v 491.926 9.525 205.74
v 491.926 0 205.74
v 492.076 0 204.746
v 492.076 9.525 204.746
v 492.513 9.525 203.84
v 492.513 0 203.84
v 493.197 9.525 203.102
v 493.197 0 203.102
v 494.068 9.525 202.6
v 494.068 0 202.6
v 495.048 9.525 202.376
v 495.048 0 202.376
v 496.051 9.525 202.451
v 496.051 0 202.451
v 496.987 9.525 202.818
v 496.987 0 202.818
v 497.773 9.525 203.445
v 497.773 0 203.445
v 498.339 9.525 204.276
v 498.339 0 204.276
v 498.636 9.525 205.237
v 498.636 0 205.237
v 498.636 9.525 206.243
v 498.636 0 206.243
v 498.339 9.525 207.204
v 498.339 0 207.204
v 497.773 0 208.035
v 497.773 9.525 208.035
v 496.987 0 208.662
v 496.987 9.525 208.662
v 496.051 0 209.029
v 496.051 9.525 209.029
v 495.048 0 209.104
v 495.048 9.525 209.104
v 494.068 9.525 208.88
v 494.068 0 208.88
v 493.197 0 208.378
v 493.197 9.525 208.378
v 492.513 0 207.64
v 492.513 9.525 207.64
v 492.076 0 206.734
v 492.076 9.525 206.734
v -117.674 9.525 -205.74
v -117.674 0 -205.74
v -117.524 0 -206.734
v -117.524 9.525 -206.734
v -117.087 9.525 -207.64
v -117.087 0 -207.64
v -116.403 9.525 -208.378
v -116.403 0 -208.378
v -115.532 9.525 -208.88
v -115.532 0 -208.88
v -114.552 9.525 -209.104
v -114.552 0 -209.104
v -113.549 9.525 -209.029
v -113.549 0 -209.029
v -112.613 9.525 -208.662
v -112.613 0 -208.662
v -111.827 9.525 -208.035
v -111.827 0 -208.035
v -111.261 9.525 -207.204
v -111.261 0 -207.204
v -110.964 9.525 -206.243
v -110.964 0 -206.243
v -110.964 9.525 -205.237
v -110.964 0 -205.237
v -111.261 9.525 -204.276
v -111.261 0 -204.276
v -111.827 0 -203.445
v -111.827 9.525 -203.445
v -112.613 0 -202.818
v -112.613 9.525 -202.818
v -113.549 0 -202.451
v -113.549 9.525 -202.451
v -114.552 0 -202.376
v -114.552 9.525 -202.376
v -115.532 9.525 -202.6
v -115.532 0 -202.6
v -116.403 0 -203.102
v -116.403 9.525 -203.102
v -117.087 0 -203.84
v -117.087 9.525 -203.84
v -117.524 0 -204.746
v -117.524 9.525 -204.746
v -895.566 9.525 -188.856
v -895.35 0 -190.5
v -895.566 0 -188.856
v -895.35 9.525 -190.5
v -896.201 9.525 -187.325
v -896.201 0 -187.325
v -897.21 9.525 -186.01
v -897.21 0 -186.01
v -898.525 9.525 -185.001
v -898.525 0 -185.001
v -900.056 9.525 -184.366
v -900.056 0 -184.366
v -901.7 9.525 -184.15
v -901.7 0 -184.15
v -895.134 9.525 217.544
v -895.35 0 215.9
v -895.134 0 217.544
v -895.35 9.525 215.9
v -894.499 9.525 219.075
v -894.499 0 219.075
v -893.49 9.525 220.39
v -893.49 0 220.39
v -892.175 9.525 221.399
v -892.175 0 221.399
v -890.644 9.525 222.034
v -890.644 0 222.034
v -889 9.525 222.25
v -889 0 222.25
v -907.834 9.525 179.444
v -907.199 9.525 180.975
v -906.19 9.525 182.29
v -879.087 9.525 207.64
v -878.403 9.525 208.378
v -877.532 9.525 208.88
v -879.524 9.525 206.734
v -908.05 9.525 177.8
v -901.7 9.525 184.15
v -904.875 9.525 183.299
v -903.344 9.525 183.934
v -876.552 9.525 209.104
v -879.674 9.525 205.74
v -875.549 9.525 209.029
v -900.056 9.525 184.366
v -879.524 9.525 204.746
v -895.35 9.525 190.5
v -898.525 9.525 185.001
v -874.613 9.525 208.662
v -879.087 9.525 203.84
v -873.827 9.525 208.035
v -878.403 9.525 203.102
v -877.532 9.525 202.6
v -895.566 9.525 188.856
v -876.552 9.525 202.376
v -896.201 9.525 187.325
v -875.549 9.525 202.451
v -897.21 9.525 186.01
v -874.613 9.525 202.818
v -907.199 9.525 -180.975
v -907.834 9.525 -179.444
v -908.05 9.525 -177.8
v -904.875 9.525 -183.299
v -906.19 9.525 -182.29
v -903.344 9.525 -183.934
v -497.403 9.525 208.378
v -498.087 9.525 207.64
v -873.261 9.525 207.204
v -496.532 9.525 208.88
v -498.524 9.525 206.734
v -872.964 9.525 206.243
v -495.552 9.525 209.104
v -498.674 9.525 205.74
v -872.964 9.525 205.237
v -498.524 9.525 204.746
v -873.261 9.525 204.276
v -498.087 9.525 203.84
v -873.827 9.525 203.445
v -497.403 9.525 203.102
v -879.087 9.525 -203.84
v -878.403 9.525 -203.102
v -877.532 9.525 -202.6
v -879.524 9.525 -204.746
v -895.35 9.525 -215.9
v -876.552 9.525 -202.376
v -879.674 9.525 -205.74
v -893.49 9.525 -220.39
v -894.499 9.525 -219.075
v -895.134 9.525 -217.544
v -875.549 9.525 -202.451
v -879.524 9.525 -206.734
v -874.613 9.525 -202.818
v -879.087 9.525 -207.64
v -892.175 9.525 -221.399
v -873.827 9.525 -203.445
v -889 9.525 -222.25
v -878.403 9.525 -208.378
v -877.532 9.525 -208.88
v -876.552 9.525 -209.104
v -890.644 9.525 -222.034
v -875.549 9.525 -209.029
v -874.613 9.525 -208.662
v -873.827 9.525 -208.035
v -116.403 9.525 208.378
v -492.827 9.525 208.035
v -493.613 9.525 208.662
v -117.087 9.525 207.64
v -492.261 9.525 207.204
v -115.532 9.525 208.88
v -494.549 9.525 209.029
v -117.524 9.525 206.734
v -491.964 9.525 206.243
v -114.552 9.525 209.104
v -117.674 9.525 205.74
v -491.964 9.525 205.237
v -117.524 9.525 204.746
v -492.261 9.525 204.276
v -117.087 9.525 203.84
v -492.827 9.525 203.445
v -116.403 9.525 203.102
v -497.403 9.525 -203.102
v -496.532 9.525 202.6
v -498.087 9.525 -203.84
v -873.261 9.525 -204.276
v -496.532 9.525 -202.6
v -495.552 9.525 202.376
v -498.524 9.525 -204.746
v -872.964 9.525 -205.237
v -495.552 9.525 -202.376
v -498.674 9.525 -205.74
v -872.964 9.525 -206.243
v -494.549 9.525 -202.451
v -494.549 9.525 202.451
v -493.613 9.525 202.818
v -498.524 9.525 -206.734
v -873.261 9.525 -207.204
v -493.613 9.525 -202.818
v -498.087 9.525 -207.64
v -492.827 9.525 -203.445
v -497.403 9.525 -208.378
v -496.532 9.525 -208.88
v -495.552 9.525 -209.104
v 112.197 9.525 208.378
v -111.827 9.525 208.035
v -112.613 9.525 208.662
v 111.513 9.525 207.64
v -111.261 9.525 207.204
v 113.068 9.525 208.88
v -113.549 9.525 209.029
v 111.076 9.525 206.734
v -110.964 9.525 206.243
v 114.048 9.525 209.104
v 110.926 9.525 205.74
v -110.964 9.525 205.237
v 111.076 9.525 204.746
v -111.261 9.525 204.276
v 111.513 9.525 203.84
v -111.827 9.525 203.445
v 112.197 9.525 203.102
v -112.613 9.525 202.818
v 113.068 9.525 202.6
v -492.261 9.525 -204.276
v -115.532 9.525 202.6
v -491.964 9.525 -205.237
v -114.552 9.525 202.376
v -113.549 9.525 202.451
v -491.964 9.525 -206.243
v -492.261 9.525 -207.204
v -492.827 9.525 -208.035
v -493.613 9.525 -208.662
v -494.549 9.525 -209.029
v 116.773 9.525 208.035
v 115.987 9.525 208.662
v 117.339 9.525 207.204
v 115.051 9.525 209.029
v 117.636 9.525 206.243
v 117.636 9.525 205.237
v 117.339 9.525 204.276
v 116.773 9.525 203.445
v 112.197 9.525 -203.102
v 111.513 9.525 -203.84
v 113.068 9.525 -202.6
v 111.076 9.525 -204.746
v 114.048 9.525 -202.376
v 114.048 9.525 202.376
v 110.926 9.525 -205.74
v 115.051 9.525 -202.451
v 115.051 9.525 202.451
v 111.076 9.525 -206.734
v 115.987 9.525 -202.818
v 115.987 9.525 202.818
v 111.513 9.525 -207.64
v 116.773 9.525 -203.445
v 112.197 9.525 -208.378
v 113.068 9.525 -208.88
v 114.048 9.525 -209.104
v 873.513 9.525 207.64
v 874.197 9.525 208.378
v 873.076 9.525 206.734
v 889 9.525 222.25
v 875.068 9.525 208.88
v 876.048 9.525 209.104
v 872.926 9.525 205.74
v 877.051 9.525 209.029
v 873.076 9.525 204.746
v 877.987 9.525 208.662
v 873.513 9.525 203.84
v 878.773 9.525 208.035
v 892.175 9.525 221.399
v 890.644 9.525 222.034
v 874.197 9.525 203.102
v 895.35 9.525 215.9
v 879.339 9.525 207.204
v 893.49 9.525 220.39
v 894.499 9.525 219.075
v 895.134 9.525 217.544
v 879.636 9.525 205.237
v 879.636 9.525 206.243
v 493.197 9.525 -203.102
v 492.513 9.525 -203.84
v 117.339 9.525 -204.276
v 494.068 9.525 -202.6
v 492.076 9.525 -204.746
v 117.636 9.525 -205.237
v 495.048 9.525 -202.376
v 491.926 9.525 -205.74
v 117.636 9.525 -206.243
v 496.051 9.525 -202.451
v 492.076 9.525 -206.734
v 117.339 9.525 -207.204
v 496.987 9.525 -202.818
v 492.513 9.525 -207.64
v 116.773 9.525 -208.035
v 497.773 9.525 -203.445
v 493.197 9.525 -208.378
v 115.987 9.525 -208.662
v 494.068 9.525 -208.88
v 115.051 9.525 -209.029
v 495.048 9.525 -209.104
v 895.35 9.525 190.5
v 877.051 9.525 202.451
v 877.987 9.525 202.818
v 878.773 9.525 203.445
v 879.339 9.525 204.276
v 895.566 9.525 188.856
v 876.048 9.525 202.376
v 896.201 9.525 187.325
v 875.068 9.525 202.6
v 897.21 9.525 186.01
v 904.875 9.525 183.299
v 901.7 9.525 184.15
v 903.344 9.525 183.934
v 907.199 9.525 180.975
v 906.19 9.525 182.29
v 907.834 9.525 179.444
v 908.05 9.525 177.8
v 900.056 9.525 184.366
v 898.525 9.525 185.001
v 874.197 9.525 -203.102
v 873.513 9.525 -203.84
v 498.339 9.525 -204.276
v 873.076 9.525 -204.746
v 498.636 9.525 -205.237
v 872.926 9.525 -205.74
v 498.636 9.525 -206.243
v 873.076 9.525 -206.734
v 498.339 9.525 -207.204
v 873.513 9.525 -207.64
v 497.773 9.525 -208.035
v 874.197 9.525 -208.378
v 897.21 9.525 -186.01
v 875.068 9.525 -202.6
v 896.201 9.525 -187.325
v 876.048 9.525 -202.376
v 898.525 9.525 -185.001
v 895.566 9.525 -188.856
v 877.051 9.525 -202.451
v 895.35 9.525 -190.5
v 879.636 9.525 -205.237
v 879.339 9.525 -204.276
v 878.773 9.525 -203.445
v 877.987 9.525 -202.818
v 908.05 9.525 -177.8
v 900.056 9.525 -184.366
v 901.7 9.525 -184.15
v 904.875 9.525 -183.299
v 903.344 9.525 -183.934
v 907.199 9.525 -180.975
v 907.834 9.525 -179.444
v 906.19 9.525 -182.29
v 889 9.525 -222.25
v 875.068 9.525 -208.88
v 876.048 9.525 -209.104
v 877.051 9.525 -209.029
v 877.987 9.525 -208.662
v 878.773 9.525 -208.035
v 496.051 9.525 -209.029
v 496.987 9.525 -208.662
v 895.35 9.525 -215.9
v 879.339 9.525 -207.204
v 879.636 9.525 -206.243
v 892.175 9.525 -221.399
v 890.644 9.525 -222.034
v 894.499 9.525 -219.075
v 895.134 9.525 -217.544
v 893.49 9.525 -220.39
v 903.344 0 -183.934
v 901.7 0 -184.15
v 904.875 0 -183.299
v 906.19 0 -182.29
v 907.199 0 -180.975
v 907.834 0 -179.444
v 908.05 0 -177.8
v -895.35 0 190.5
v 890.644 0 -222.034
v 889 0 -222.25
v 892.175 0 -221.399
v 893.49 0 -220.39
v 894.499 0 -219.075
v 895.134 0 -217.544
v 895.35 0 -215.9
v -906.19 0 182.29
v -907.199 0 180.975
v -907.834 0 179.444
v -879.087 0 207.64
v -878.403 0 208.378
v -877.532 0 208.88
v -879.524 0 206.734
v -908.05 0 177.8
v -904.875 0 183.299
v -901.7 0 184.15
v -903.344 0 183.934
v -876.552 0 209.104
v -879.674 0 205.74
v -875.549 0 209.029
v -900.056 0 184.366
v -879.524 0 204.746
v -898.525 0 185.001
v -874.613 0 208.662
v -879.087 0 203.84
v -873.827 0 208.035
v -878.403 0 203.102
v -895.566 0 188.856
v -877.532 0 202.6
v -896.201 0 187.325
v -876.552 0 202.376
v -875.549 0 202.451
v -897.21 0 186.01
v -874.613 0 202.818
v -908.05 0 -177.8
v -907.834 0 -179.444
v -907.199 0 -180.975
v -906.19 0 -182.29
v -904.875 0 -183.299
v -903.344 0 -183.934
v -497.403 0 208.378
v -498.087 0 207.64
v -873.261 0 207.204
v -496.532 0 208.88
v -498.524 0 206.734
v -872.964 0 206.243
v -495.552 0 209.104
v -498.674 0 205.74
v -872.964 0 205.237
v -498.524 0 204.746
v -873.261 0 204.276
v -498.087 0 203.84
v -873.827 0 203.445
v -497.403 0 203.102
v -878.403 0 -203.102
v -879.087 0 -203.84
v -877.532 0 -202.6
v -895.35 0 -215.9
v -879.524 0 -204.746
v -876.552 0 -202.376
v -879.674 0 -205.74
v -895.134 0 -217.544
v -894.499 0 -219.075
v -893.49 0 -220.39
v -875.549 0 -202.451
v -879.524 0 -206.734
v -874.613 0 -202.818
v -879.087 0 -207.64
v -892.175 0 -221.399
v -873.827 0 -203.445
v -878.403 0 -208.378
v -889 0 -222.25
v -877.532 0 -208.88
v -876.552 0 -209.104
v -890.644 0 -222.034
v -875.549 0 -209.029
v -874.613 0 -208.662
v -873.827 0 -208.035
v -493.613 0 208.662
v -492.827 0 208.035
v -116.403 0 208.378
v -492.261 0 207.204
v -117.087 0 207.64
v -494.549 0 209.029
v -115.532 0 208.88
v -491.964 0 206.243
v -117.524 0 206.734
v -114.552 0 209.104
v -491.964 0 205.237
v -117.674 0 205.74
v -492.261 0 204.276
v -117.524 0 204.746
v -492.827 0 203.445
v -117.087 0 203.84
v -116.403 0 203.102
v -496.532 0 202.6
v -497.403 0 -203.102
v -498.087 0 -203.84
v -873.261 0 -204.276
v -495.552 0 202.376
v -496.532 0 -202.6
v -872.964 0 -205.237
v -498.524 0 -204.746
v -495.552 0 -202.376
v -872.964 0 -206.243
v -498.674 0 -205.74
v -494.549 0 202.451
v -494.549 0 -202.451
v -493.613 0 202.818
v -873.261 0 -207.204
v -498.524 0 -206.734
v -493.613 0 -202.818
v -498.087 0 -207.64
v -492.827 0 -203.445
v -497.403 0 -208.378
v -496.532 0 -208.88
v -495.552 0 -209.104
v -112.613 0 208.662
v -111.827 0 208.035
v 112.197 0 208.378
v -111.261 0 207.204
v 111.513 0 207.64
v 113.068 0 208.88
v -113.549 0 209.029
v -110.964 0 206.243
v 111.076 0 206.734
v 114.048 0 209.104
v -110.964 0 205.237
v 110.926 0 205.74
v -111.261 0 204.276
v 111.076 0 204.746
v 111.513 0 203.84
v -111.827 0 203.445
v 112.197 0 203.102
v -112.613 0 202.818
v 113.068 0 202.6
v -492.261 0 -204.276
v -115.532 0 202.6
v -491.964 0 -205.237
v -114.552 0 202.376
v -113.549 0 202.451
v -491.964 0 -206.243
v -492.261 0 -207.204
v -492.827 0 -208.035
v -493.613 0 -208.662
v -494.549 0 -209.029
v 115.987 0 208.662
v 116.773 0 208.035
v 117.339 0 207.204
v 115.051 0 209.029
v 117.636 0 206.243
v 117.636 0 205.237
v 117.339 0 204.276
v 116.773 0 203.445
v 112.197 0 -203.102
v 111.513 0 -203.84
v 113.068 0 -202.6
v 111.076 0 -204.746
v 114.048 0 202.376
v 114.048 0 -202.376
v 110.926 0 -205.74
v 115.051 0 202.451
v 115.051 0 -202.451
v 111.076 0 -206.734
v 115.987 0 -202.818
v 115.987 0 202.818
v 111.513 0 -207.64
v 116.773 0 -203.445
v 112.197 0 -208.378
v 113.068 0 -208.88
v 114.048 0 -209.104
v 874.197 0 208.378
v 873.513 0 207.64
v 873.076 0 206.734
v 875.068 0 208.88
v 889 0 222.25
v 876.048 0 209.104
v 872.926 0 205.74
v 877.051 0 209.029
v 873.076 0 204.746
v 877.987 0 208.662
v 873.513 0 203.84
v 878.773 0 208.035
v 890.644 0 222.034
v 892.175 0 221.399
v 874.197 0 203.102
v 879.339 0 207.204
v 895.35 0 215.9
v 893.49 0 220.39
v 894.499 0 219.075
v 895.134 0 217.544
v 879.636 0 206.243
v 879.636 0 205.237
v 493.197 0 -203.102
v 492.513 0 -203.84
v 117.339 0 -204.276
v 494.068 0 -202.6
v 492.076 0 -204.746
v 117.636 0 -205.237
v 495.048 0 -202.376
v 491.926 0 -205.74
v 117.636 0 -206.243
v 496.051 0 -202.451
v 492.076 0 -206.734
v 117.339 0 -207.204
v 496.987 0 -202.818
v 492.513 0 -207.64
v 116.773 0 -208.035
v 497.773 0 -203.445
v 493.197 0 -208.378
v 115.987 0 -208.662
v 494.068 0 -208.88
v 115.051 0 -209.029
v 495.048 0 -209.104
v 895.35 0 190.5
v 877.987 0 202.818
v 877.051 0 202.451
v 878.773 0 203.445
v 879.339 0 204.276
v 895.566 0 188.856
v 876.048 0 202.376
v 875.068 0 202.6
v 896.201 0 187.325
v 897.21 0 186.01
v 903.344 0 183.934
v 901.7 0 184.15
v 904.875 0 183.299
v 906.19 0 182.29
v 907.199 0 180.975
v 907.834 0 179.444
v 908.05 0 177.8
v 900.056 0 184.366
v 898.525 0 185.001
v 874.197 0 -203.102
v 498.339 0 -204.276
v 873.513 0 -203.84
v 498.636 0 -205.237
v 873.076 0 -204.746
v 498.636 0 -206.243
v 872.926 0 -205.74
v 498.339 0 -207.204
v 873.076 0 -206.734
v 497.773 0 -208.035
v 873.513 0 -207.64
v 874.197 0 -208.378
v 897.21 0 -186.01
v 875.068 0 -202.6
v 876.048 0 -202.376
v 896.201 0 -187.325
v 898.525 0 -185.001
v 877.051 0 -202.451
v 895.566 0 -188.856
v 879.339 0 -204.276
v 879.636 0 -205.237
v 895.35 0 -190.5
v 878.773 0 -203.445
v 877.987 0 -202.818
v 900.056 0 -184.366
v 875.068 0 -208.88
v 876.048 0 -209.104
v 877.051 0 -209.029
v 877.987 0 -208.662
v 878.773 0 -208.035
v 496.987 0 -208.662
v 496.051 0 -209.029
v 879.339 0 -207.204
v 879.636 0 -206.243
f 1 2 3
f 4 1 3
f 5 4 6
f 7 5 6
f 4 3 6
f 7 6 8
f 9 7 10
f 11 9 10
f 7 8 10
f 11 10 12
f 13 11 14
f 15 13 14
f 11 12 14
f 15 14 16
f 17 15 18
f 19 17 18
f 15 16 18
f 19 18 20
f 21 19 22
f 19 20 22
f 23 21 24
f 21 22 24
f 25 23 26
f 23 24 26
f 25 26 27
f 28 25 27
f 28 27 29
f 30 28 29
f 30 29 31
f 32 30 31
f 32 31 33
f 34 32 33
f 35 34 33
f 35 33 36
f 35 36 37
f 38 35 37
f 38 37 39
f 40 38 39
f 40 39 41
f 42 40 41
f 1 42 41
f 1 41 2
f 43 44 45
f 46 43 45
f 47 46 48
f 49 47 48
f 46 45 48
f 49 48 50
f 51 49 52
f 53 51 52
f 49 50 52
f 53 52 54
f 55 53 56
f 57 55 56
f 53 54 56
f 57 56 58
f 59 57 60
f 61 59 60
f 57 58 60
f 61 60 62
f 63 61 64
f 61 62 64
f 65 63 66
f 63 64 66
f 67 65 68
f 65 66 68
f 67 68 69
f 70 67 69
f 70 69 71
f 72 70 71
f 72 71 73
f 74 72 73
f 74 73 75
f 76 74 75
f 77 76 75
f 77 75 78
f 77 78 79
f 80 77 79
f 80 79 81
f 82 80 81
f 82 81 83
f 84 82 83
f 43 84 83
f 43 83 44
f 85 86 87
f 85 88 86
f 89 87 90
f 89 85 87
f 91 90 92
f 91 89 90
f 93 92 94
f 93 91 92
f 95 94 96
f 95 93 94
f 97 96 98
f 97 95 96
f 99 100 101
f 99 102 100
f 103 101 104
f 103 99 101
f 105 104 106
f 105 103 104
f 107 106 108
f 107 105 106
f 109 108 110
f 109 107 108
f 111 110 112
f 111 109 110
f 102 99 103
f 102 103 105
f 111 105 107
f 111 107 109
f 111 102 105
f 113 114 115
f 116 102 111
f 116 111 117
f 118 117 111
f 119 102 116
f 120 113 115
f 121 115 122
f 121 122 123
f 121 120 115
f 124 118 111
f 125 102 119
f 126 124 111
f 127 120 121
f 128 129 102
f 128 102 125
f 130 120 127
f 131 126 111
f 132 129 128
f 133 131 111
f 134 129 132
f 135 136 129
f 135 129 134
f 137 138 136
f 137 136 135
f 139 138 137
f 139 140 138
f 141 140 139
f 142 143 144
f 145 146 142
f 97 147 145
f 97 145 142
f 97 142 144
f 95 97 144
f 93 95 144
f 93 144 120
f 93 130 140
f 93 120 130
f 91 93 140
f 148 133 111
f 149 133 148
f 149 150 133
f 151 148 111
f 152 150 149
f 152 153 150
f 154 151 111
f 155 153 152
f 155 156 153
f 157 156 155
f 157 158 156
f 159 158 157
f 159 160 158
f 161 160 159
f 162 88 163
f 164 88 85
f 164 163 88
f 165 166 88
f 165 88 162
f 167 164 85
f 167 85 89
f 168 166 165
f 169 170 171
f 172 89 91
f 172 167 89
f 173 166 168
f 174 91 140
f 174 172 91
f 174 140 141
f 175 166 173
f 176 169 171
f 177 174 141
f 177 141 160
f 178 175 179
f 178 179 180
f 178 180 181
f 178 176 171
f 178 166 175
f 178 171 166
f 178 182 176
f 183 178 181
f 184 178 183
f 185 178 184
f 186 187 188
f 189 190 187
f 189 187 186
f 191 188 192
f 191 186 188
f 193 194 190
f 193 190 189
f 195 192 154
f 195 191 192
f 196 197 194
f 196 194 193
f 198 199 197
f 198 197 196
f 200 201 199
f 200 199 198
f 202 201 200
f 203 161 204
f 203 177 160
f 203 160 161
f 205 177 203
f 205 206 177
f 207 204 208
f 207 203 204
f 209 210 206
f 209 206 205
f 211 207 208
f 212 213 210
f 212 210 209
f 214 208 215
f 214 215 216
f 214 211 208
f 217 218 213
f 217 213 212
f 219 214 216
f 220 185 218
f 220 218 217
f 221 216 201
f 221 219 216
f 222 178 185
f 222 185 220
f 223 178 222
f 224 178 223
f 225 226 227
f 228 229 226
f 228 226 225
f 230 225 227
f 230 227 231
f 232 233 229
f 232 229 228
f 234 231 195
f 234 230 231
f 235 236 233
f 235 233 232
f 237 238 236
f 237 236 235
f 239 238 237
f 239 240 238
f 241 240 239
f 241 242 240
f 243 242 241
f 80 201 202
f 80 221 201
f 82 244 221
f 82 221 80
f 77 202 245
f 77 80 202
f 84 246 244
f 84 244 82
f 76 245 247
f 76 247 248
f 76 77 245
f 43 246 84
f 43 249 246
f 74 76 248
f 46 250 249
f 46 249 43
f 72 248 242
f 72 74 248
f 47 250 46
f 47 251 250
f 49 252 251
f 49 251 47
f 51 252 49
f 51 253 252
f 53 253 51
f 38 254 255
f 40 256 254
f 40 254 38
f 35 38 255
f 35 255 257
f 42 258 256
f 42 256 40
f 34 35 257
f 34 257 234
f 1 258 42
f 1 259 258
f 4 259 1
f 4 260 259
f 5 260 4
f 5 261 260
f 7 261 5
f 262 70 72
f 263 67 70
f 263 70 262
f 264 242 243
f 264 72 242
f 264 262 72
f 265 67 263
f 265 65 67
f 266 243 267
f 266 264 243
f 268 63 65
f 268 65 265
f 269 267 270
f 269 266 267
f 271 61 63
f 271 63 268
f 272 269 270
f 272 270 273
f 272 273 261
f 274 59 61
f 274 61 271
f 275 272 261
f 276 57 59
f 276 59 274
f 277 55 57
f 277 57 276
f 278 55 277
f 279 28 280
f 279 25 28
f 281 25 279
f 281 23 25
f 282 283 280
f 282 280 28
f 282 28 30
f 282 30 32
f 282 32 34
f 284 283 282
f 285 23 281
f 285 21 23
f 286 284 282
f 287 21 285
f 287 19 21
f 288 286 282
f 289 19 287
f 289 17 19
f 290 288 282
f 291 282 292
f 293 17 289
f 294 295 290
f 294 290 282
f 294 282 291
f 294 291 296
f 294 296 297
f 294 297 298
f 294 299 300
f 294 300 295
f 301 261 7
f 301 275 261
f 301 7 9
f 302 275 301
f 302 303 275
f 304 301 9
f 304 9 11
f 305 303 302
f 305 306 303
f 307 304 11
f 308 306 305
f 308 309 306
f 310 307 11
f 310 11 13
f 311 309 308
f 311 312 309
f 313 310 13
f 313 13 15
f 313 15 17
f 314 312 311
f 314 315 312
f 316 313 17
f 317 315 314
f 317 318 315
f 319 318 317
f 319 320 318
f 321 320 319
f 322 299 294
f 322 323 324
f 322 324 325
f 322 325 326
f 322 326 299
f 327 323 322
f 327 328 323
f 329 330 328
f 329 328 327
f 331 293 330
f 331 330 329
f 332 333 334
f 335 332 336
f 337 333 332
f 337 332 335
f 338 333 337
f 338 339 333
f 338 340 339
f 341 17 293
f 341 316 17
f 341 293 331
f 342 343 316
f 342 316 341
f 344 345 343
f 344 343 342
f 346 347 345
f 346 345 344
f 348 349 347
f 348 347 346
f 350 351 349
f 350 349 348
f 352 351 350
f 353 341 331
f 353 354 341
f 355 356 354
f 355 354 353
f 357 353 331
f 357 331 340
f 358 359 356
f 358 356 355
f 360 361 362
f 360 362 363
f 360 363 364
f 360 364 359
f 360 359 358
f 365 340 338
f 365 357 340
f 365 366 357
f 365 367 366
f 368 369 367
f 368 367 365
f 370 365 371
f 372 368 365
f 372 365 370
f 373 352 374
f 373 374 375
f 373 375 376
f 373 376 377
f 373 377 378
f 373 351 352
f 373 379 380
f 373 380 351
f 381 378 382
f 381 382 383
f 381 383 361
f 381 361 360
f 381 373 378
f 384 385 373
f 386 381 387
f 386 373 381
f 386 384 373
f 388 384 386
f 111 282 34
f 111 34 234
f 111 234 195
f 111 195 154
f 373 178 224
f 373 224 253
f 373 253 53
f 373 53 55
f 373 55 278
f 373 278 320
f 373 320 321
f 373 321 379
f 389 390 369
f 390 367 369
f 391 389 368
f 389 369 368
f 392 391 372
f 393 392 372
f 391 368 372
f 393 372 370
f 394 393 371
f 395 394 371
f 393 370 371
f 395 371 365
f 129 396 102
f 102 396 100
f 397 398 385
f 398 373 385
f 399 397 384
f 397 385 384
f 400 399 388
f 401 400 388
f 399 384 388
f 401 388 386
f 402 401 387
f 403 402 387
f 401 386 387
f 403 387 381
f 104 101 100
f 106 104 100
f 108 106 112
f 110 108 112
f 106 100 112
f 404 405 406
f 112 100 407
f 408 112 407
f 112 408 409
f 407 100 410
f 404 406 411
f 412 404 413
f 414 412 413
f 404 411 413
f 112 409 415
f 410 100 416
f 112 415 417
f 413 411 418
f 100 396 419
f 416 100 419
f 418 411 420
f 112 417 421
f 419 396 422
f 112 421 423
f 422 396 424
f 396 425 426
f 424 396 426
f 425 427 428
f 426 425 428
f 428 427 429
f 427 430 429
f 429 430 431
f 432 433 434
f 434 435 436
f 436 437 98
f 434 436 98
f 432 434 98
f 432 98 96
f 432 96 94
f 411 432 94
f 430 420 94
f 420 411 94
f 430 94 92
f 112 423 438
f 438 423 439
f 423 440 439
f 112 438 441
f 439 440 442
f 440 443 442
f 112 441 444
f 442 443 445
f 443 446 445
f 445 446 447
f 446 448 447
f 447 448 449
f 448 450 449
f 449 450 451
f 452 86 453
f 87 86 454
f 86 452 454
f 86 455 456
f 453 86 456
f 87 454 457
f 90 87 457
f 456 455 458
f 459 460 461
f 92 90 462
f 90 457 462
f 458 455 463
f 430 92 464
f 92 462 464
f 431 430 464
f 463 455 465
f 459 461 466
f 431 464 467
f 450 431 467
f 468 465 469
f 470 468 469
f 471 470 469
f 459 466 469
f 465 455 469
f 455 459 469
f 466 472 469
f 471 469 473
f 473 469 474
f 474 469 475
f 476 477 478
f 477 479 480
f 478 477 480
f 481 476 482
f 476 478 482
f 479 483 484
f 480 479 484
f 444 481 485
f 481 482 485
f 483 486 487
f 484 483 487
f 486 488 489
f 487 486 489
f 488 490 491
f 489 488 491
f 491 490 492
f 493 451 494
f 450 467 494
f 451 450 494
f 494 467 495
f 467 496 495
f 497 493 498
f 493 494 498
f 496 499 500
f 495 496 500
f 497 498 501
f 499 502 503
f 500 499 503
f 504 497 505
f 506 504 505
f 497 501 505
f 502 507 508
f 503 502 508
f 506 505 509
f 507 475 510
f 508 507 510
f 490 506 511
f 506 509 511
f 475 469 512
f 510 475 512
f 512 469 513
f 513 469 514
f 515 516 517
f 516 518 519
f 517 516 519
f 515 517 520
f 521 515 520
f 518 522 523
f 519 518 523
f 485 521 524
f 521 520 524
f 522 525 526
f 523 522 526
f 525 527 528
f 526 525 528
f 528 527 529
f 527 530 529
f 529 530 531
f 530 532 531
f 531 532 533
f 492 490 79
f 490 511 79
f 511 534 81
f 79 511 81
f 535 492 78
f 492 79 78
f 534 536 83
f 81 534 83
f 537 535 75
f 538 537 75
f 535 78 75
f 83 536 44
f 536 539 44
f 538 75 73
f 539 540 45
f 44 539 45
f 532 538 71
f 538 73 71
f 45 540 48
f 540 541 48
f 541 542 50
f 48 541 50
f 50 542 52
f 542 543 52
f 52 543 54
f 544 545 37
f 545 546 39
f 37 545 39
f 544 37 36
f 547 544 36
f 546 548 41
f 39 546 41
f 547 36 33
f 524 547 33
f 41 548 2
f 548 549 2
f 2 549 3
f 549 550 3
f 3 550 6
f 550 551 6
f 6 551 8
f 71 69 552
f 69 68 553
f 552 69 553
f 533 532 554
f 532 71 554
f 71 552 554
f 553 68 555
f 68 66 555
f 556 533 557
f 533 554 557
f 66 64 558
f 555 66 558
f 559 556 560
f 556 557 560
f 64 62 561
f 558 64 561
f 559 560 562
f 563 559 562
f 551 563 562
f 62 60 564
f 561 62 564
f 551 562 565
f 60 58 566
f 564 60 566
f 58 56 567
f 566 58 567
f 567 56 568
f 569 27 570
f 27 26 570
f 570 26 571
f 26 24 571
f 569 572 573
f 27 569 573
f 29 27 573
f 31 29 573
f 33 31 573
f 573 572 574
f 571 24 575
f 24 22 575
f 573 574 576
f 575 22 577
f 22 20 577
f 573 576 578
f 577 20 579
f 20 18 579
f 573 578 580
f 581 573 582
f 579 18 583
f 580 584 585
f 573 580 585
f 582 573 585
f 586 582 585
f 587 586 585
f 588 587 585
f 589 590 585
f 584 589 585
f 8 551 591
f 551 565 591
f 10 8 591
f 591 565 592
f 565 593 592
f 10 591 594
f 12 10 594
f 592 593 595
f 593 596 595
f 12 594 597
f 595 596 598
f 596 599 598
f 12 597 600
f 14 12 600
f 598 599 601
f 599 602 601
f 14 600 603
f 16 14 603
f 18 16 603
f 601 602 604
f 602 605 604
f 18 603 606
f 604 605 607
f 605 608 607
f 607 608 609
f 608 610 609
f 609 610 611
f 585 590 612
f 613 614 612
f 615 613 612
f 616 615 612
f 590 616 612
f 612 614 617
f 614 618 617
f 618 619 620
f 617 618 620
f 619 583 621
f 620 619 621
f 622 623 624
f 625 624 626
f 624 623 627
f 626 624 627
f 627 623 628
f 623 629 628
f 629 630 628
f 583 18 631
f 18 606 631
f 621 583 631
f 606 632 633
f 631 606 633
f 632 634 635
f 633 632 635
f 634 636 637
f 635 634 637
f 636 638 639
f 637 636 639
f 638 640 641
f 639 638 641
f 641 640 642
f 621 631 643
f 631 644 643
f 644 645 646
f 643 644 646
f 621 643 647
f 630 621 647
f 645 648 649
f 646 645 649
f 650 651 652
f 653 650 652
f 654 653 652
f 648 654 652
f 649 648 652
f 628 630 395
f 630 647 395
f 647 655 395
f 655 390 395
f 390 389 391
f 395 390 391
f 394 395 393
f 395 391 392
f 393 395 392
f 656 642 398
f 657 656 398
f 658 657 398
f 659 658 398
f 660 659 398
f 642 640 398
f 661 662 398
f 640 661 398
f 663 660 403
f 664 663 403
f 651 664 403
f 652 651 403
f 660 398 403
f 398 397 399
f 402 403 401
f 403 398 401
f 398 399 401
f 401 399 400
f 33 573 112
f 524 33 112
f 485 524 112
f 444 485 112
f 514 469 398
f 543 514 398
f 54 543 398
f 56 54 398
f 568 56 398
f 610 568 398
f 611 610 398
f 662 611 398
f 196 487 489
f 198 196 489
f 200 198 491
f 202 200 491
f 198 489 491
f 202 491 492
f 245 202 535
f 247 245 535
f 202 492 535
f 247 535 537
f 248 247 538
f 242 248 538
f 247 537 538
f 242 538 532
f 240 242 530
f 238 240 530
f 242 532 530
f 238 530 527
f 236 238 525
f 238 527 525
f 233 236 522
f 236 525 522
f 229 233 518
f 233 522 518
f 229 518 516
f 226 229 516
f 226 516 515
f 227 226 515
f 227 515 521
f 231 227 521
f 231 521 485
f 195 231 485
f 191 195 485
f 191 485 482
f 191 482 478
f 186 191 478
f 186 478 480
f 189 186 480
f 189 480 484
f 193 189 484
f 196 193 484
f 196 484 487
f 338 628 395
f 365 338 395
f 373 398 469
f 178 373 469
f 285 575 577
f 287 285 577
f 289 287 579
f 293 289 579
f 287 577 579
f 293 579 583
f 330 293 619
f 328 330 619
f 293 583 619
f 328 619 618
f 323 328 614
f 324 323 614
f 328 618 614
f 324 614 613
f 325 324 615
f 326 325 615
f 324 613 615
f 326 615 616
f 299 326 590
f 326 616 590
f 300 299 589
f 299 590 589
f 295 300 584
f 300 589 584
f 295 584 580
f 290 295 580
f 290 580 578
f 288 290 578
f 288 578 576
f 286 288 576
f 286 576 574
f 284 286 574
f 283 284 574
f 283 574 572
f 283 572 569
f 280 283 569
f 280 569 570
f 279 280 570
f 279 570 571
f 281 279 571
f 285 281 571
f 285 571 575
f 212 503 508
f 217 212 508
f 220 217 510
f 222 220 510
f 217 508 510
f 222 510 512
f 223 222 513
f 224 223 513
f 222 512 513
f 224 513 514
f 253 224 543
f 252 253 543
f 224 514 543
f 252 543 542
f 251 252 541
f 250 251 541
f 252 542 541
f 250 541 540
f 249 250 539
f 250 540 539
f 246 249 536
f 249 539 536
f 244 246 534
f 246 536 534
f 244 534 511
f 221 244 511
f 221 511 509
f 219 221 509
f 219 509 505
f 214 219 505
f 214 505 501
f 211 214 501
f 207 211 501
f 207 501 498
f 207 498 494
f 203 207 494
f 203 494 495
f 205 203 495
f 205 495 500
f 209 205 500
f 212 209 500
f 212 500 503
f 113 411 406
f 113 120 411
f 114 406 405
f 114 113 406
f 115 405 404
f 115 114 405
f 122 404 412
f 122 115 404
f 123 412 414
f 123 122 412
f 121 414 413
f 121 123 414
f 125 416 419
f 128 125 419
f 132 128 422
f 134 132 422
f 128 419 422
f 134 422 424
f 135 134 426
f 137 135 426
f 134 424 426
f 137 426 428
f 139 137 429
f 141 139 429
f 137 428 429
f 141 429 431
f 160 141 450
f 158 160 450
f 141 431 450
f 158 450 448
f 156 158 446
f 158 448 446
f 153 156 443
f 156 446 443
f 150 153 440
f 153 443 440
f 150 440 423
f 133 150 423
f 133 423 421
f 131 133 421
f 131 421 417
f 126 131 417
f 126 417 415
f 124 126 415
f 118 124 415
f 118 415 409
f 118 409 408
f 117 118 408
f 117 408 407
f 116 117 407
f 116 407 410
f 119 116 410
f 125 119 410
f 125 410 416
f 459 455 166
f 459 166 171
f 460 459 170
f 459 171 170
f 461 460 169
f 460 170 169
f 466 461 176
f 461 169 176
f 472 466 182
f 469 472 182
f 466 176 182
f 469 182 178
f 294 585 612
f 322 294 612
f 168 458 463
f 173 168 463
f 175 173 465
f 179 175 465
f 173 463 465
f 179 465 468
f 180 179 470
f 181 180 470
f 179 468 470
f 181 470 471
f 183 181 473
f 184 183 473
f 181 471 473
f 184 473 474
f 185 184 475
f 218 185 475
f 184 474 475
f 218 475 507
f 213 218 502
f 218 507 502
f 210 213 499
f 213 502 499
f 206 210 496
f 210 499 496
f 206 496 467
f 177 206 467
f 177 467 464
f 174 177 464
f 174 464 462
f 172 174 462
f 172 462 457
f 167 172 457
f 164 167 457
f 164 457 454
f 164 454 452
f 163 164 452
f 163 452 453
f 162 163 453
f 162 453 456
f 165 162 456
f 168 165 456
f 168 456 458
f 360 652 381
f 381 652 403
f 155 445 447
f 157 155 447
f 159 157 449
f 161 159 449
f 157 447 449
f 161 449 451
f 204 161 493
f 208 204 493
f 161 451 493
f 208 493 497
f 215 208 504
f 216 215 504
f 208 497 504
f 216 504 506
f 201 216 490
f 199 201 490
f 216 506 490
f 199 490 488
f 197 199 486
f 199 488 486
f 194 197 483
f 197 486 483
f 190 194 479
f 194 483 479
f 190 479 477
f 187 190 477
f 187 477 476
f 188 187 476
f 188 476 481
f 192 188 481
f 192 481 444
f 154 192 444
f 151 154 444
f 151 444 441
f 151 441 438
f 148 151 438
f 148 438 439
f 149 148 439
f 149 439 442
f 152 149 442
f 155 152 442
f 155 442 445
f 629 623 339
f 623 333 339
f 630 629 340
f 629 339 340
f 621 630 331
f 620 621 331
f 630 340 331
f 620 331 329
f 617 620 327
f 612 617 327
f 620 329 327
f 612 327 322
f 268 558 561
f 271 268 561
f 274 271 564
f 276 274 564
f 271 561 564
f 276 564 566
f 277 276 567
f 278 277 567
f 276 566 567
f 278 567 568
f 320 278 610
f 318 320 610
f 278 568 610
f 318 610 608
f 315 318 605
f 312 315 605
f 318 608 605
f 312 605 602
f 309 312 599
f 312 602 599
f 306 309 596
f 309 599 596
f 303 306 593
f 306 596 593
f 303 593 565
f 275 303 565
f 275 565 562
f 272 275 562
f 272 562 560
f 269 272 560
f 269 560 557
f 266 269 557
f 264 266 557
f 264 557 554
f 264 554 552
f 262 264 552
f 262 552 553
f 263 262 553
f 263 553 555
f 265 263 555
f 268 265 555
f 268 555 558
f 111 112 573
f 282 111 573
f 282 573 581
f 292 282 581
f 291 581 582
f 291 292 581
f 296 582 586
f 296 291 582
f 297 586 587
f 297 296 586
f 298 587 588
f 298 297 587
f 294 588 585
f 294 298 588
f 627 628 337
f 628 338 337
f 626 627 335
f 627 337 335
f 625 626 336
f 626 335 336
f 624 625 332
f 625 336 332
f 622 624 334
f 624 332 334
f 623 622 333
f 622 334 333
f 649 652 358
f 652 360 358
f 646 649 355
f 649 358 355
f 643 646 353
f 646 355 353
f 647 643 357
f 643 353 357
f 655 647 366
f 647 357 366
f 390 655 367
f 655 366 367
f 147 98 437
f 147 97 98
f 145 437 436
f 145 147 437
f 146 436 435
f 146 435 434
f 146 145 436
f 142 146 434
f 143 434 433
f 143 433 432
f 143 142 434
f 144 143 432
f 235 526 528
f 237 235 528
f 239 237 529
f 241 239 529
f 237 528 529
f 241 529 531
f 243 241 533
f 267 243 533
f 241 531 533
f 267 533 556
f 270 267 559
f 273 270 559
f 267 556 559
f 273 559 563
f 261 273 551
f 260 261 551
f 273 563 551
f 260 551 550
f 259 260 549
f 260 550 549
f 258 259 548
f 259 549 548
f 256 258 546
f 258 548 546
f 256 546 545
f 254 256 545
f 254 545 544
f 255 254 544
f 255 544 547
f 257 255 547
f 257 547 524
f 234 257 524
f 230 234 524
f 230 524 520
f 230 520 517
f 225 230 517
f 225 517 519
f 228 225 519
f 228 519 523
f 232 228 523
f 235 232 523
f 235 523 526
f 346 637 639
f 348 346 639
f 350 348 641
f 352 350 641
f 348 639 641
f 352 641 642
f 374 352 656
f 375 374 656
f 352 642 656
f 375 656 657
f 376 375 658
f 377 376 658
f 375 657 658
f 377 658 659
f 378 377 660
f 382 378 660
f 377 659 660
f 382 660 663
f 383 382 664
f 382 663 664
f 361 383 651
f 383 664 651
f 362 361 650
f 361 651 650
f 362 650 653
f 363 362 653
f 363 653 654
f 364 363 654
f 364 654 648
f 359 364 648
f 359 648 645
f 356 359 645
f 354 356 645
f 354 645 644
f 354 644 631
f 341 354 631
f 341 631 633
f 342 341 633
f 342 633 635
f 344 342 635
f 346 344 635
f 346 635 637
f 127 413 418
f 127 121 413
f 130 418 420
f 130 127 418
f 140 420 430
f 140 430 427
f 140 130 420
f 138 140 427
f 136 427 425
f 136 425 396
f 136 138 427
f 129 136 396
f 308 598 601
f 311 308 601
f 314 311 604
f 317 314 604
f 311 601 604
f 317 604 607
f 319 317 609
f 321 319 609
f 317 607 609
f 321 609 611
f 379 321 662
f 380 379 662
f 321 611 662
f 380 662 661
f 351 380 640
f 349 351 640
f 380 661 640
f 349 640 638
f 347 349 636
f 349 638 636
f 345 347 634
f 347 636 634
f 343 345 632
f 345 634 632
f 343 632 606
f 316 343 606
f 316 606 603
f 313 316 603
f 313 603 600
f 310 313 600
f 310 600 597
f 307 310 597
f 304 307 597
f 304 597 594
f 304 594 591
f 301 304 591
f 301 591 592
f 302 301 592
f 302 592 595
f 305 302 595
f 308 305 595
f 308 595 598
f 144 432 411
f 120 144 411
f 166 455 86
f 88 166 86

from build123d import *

# Parameters (mm, degrees)
BOSS_EXTRUDE1_DEPTH              = 9.525
F_17_64_0_26563_DIAMETER_HOLE1_D = 6.747002
FILLET1_R                        = 6.35


with BuildPart() as part:
    # Sketch1 → Boss-Extrude1 (new body)
    with BuildSketch(Plane(origin=(0, 0, 0), x_dir=(1, 0, 0), z_dir=(0, 1, 0))):
        Polygon((-895.35, 222.25), (-895.35, 184.15), (-908.05, 184.15), (-908.05, -184.15), (-895.35, -184.15), (-895.35, -222.25), (895.35, -222.25), (895.35, -184.15), (908.05, -184.15), (908.05, 184.15), (895.35, 184.15), (895.35, 222.25), align=None)
    extrude(amount=BOSS_EXTRUDE1_DEPTH)

    # 17/64 (0.26563) Diameter Hole1 (through all)
    with Locations(Plane(origin=(0, 9.525, 0), x_dir=(1, 0, 0), z_dir=(0, 1, 0))):
        with Locations((-876.3, -205.74), (-495.3, -205.74), (-876.3, 205.74), (-495.3, 205.74), (-114.3, 205.74), (-114.3, -205.74), (114.3, -205.74), (114.3, 205.74), (495.3, 205.74), (876.3, 205.74), (495.3, -205.74), (876.3, -205.74)):
            Hole(F_17_64_0_26563_DIAMETER_HOLE1_D / 2)

    # Fillet1
    fillet1_edges = [part.edges().sort_by_distance(p)[0] for p in [
        (895.35, 4.7625, 222.25),
        (895.35, 4.7625, 184.15),
        (908.05, 4.7625, 184.15),
        (908.05, 4.7625, -184.15),
        (895.35, 4.7625, -184.15),
        (895.35, 4.7625, -222.25),
        (-908.05, 4.7625, -184.15),
        (-895.35, 4.7625, -184.15),
        (-895.35, 4.7625, -222.25),
        (-895.35, 4.7625, 222.25),
        (-895.35, 4.7625, 184.15),
        (-908.05, 4.7625, 184.15),
    ]]
    fillet(fillet1_edges, radius=FILLET1_R - 0.0001)  # a hair under: the kernel refuses the full size


solid = part.part
